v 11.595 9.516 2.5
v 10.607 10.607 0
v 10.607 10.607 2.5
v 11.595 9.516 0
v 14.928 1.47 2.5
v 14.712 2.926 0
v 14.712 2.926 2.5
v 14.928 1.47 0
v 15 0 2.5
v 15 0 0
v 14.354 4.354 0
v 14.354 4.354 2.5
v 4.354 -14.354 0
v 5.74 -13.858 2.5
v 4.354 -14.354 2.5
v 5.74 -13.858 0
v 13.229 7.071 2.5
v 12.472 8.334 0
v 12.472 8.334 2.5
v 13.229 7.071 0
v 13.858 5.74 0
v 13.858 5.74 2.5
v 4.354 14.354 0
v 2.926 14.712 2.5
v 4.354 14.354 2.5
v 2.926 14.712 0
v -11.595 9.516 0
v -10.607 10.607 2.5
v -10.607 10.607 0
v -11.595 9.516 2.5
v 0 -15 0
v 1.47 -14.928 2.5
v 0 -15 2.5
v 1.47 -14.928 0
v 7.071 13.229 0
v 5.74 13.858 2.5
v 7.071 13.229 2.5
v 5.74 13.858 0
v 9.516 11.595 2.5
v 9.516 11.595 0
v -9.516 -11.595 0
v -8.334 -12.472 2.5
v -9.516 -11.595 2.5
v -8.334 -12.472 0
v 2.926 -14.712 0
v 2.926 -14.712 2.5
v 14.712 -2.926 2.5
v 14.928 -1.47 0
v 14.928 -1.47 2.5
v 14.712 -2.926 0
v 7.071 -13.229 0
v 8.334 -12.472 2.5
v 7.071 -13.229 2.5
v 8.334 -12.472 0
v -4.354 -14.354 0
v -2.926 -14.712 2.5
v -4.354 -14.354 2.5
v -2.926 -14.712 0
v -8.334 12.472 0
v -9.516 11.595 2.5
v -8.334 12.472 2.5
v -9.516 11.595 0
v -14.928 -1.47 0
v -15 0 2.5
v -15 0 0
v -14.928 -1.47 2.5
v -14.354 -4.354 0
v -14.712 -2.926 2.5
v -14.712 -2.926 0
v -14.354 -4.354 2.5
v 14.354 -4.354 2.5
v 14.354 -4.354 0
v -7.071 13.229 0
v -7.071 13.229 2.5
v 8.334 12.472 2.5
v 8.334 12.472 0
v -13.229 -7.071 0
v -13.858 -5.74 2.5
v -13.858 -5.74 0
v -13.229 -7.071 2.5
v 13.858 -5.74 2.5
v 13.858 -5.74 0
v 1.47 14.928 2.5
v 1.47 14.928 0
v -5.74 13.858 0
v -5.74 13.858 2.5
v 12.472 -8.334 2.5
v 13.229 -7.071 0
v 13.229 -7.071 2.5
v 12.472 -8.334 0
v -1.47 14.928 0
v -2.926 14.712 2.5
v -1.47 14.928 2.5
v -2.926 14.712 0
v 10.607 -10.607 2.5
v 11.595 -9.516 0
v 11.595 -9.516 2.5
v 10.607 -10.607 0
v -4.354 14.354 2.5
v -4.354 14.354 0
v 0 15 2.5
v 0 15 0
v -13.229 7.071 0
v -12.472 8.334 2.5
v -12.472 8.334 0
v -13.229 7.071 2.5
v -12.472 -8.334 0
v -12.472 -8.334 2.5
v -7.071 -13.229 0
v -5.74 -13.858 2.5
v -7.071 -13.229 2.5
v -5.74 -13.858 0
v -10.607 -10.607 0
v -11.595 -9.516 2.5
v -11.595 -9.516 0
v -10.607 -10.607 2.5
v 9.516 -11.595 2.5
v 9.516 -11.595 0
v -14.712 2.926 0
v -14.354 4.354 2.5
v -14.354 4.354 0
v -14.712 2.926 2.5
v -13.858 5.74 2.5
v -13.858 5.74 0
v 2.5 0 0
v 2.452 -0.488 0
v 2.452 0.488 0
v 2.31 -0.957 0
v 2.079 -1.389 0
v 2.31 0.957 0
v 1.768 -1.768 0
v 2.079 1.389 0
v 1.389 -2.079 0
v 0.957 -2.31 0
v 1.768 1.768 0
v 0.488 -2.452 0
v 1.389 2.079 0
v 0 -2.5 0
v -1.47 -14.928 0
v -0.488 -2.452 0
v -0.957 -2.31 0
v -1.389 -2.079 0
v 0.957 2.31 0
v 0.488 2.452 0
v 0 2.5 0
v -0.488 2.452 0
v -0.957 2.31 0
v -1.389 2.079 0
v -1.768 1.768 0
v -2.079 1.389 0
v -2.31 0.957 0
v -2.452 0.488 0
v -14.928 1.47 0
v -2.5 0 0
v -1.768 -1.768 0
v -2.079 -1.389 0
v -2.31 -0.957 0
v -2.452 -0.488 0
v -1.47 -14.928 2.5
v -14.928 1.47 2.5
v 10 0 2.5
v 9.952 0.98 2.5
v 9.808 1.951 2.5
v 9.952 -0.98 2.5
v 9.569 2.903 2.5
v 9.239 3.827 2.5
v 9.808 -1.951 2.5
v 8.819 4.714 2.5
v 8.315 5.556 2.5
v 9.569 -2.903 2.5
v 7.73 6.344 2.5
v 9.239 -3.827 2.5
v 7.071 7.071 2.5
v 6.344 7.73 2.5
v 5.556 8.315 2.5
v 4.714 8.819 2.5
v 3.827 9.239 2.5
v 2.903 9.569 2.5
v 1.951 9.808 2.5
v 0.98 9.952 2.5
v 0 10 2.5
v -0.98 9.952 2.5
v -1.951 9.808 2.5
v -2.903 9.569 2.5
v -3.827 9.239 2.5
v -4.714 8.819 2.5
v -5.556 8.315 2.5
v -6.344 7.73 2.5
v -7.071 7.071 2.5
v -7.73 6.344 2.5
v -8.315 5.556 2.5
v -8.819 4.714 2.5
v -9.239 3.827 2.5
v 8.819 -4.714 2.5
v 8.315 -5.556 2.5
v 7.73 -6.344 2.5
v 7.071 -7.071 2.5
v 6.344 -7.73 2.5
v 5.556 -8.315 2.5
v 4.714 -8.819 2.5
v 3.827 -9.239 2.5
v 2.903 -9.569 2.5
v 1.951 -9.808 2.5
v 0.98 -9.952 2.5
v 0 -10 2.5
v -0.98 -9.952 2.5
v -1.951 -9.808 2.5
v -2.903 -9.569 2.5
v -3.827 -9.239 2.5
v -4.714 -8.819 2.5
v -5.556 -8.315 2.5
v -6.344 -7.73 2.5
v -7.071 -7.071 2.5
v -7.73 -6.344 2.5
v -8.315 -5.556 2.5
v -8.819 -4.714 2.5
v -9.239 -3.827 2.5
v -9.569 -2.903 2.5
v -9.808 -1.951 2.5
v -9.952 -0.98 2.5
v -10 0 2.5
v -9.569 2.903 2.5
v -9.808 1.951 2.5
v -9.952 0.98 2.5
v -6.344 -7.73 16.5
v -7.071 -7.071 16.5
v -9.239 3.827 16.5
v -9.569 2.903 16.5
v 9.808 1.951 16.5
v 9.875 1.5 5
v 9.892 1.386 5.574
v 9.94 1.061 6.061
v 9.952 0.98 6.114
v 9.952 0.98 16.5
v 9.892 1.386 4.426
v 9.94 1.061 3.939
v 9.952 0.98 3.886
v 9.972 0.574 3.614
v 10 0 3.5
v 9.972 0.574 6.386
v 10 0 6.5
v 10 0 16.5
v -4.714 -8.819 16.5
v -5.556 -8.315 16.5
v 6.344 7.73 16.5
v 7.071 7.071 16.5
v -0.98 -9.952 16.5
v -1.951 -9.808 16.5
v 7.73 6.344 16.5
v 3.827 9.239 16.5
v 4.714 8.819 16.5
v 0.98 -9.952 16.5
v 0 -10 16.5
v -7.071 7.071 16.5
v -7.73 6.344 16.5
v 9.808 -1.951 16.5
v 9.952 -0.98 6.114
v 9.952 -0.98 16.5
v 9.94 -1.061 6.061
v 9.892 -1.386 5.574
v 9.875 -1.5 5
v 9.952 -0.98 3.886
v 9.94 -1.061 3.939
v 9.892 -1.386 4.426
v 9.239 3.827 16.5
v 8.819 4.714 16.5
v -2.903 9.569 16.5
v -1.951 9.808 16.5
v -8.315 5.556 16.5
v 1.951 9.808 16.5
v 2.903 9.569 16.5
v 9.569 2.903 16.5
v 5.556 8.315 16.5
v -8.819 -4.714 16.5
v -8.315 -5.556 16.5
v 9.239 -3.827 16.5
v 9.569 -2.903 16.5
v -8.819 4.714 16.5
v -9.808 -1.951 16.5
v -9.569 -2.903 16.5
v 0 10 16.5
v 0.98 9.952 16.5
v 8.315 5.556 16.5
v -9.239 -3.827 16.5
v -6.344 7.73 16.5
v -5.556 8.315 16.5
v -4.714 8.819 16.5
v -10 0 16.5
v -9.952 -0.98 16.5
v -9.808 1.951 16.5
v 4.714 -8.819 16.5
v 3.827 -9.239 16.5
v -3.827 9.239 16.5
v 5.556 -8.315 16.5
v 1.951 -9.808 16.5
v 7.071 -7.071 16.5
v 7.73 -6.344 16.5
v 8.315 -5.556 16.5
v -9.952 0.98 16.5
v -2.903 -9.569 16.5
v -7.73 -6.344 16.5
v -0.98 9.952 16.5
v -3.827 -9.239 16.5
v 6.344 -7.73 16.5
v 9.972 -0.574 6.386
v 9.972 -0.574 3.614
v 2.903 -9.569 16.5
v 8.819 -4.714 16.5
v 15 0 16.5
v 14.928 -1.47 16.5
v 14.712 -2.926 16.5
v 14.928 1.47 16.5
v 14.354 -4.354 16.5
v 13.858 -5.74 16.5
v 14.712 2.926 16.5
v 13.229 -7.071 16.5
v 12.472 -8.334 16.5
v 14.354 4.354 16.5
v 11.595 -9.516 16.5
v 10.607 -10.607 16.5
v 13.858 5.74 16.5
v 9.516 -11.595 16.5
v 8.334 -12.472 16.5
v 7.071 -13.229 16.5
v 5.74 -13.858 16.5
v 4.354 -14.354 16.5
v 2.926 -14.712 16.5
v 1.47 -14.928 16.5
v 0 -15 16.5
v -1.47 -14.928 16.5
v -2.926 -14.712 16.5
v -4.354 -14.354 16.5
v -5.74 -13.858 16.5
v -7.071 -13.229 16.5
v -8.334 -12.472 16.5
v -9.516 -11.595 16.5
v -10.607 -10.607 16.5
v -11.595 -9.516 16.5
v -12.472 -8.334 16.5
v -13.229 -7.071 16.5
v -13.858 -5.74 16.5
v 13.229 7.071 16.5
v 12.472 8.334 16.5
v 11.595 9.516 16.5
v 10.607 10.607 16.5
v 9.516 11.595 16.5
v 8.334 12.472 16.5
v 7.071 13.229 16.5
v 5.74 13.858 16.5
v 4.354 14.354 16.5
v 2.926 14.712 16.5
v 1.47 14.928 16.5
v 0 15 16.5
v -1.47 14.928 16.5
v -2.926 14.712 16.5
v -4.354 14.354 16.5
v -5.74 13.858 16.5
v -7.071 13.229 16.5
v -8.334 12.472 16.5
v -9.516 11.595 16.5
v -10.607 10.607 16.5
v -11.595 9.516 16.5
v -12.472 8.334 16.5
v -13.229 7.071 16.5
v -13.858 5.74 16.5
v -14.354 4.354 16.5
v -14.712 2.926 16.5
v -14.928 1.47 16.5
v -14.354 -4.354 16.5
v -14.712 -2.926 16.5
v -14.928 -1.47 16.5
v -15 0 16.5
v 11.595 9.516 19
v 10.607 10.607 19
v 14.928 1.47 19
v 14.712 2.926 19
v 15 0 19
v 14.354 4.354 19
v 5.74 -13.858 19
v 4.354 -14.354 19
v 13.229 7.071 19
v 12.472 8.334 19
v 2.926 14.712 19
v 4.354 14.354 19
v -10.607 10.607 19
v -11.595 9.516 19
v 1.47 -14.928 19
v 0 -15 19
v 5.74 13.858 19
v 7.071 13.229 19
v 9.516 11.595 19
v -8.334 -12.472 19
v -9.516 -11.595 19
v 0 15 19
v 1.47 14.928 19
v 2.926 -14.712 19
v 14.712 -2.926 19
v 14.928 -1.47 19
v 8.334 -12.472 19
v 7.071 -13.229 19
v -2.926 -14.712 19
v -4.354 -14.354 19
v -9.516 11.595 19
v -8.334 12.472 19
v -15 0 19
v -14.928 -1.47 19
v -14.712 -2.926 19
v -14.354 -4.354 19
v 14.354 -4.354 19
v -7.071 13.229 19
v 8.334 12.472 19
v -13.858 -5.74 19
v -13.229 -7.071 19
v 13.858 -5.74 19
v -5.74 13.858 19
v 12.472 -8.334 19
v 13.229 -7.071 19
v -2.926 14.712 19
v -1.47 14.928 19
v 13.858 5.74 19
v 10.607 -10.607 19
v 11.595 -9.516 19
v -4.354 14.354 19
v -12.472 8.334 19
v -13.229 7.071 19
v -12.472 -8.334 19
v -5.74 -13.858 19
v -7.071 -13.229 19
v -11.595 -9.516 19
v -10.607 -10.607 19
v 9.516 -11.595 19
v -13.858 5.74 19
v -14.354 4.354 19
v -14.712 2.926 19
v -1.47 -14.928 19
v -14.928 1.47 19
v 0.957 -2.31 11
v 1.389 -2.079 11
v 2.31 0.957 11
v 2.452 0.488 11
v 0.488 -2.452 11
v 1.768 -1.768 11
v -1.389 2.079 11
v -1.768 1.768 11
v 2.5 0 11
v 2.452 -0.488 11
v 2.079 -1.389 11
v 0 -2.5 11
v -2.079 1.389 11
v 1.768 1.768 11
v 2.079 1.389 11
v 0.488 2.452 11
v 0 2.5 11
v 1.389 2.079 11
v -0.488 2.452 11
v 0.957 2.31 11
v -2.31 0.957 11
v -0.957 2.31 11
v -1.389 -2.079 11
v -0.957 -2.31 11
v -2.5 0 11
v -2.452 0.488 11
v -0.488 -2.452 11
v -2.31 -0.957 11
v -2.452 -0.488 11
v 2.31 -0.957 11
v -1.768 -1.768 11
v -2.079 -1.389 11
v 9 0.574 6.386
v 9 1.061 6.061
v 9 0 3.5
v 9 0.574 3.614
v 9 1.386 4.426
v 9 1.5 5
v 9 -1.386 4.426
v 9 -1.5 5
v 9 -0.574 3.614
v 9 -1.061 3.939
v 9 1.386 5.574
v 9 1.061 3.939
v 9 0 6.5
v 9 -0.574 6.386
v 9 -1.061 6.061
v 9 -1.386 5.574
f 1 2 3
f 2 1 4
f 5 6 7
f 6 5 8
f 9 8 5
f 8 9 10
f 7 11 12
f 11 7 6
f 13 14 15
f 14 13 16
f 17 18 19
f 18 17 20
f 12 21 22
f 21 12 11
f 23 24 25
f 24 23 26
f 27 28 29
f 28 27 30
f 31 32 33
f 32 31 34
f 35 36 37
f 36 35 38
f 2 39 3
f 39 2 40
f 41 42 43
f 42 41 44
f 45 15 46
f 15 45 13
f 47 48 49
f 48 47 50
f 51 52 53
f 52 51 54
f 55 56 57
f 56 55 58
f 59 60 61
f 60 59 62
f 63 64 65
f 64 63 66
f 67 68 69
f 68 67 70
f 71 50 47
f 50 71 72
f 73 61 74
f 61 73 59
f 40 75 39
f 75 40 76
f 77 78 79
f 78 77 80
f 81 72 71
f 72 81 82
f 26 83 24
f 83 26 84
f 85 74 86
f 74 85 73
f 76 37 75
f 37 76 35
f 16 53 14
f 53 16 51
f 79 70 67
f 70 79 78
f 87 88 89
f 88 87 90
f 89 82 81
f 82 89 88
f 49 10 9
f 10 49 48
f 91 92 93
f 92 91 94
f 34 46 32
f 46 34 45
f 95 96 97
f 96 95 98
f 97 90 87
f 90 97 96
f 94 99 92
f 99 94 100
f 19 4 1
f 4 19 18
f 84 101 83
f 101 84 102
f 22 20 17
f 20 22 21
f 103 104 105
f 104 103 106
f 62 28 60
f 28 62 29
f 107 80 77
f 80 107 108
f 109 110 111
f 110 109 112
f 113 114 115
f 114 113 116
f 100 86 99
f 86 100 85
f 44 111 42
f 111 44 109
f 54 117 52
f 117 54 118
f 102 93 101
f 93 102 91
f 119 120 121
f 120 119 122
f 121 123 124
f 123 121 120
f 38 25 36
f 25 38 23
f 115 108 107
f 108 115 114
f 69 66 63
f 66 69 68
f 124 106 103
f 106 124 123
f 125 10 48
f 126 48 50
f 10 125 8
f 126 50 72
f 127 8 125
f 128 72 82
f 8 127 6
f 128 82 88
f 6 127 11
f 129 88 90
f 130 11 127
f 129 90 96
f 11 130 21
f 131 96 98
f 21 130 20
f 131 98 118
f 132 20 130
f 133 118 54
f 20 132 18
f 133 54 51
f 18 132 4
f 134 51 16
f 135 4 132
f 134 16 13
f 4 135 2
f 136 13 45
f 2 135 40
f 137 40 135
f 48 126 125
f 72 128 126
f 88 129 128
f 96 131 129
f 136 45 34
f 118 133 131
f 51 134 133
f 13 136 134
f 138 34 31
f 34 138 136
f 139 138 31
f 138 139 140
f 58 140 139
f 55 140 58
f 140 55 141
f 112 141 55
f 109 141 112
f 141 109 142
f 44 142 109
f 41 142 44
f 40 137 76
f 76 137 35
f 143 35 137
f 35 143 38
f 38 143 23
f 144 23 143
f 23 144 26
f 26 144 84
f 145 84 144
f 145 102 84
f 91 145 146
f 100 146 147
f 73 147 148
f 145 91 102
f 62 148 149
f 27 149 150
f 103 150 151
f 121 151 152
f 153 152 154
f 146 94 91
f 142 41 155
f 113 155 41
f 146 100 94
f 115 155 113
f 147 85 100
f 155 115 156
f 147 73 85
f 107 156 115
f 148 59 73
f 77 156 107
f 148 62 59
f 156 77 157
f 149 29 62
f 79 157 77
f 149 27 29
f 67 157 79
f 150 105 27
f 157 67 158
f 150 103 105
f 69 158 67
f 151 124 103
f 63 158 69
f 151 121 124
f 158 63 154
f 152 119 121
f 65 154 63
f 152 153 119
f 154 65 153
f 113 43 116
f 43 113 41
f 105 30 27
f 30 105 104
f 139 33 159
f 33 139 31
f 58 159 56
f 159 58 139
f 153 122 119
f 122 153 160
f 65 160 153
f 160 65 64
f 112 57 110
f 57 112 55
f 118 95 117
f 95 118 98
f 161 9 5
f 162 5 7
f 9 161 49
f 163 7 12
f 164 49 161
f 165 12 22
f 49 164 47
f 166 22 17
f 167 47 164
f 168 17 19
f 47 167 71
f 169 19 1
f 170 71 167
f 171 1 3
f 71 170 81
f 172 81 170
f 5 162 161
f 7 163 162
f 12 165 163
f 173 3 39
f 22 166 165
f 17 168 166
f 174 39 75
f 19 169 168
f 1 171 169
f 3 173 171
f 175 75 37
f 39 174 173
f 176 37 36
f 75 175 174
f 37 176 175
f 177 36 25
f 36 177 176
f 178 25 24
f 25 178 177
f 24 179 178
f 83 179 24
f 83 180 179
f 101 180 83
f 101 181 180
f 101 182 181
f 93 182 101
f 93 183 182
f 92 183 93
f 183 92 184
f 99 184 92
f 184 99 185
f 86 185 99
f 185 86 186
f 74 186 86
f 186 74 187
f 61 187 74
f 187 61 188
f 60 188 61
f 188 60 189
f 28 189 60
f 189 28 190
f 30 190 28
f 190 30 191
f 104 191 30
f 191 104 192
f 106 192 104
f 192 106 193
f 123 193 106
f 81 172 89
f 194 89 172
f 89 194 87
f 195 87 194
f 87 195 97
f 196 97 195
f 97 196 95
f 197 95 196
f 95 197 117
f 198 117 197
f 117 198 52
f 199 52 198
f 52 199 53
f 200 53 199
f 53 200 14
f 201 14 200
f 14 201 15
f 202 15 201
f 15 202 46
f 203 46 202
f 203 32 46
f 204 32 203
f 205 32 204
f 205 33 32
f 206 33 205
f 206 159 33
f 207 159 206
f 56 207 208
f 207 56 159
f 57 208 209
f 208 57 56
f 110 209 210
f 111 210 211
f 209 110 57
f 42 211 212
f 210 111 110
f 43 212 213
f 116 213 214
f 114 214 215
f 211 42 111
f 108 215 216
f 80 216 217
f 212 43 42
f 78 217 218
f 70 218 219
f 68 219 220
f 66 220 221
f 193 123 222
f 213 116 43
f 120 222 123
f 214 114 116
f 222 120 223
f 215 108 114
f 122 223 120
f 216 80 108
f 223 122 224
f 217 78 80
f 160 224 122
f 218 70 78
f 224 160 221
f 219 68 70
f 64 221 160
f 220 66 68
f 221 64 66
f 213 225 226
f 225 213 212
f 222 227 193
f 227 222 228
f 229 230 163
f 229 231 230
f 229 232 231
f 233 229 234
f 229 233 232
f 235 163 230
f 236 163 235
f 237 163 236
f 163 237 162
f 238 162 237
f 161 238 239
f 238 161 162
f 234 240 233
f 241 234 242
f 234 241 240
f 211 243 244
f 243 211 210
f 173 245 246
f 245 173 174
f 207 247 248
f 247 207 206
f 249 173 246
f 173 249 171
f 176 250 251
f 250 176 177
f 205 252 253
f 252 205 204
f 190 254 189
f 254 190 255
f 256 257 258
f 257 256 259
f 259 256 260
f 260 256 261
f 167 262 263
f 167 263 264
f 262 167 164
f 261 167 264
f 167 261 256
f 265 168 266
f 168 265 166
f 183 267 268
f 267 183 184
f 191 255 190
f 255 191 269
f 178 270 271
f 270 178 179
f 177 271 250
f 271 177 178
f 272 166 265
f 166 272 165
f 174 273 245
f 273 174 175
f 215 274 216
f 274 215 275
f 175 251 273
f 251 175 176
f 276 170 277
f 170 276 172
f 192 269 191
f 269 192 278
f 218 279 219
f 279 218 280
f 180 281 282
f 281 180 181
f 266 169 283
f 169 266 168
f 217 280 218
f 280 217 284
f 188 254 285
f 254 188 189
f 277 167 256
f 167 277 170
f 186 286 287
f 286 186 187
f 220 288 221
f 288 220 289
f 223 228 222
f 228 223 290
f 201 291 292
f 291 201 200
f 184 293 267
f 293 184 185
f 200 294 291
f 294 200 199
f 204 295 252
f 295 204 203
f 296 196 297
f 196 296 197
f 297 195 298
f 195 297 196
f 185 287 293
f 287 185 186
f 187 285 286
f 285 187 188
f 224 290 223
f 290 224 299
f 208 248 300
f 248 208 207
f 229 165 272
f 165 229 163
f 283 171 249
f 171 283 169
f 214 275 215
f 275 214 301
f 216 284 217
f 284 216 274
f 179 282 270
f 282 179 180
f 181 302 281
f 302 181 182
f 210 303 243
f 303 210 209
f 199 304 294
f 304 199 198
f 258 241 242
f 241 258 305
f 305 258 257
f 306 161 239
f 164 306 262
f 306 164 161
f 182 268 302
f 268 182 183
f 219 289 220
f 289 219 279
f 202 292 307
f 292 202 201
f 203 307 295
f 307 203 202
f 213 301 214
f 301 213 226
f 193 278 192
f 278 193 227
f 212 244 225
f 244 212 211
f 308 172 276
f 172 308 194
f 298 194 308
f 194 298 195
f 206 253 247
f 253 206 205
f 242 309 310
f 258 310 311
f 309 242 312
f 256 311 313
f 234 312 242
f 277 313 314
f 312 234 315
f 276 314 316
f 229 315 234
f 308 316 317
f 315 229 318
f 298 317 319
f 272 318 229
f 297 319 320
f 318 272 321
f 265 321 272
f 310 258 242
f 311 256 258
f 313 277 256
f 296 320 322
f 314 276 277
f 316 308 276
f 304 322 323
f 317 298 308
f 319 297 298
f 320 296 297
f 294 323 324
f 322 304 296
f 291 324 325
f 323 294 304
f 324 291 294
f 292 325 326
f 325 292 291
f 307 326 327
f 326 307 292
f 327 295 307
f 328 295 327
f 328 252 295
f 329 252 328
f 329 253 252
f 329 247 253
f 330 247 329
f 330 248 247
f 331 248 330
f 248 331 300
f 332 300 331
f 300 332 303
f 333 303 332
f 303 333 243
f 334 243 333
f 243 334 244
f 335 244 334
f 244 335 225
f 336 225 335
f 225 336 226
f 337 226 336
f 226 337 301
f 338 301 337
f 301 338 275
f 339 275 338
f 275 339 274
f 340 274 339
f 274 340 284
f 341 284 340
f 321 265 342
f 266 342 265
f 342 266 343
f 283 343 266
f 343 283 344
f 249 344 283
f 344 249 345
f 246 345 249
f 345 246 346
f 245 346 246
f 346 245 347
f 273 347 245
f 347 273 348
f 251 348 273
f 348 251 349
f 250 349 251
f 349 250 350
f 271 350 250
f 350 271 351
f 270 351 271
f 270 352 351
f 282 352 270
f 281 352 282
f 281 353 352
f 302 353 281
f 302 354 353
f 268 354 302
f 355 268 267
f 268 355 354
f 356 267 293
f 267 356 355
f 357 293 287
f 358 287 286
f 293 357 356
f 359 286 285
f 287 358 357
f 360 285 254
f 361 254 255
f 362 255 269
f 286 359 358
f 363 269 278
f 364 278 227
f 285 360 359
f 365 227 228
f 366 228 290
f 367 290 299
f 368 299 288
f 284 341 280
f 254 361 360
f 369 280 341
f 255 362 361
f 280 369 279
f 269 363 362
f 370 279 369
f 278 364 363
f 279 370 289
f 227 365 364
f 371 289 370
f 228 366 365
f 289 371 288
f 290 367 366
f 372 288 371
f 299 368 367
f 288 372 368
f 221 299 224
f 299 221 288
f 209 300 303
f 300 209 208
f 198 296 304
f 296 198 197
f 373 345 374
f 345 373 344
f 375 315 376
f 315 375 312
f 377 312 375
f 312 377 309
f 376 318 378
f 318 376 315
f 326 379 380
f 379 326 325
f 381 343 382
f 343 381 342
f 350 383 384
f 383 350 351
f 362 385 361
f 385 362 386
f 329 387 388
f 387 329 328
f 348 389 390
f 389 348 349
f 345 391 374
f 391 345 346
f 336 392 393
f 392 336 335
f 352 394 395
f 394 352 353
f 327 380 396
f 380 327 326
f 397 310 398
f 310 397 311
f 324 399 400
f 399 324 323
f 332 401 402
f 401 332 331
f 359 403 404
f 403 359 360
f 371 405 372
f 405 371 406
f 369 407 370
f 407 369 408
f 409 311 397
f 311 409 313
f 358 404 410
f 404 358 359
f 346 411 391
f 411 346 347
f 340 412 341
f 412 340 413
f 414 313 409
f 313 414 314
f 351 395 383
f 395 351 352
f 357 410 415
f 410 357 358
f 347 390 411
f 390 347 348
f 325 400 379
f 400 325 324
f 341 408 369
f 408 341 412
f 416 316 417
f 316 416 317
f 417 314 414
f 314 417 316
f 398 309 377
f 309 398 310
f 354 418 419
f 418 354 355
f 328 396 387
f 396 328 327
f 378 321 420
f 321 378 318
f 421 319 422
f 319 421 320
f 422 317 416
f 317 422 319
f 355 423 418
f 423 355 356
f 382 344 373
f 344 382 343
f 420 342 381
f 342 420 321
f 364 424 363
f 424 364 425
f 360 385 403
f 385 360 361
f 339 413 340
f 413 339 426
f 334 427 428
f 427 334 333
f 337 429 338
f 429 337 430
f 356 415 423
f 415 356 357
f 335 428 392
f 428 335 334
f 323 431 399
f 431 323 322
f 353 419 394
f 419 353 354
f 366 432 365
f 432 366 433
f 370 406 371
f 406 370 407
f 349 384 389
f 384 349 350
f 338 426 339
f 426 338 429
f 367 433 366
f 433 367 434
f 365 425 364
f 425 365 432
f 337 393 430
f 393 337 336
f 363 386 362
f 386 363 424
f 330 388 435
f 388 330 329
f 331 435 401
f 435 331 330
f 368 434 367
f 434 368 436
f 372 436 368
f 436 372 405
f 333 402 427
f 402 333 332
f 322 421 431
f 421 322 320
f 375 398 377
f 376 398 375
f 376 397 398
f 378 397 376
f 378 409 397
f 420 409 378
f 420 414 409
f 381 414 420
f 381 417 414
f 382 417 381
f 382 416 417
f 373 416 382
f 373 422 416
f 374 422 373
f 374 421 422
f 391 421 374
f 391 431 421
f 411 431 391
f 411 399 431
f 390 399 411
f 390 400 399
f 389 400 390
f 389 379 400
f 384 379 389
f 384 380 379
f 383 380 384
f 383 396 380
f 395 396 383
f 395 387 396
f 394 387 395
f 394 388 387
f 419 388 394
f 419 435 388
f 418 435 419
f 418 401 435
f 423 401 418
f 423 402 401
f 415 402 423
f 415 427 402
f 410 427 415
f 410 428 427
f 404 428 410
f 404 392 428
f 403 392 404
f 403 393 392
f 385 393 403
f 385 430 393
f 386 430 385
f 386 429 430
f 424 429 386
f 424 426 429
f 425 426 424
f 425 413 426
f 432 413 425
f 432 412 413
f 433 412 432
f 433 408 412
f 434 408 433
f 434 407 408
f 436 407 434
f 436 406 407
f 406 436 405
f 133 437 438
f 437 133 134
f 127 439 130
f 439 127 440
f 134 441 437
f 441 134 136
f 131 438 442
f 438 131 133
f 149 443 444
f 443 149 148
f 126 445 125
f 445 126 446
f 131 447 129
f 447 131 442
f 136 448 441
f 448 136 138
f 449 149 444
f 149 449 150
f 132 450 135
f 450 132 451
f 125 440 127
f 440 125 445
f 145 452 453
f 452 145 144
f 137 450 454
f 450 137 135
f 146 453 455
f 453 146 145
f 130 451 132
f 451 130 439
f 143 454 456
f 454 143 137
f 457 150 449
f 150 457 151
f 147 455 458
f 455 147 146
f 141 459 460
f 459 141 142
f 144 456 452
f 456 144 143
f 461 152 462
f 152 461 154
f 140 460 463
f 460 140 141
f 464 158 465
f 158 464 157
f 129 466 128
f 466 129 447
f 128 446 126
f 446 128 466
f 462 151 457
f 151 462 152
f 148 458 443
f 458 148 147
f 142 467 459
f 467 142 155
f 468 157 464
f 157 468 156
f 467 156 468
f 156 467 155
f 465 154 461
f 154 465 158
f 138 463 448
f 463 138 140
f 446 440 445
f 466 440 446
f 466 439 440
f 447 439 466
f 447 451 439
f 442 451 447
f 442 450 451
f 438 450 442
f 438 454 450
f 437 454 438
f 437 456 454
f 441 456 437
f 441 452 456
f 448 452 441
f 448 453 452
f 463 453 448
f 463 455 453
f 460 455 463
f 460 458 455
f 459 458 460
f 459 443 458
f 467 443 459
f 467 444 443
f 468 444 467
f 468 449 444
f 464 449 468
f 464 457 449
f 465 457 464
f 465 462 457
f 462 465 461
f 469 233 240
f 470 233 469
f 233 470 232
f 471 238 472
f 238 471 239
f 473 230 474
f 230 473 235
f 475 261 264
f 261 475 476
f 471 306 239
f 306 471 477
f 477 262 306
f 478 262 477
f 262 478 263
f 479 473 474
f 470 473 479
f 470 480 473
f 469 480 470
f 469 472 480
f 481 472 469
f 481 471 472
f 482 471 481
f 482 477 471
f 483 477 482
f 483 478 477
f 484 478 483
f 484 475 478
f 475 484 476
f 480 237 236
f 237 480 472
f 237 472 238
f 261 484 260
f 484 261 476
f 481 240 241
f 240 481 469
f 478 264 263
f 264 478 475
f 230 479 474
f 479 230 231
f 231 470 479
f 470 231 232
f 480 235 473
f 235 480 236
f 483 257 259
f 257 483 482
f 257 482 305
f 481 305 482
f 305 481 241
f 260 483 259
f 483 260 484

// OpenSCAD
// SpiderPi Spool v1 - Uses 5mm shaft coupler
// Use when you have a 5mm-to-5mm rigid coupler
// This spool mounts to the output side of the coupler

coupler_d = 18.0;      // Outer diameter of coupler
coupler_bore = 5.0;    // Bore to fit coupler shaft or set screw side
flange_d = 30.0;
flange_t = 2.5;
barrel_d = 20.0;
barrel_h = 14.0;
hub_h = 10.0;

module spool_coupler() {
    difference() {
        union() {
            cylinder(d = flange_d, h = flange_t, $fn=64);
            translate([0,0,flange_t]) cylinder(d=barrel_d, h=barrel_h, $fn=64);
            translate([0,0,flange_t+barrel_h]) cylinder(d=flange_d, h=flange_t, $fn=64);
            cylinder(d=coupler_d, h=hub_h, $fn=32);
        }
        cylinder(d=coupler_bore, h=hub_h+1, $fn=32);
        // M3 set screw
        translate([coupler_d/2, 0, hub_h/2])
            rotate([0,90,0]) cylinder(d=3.0, h=coupler_d, $fn=16);
    }
}

spool_coupler();
